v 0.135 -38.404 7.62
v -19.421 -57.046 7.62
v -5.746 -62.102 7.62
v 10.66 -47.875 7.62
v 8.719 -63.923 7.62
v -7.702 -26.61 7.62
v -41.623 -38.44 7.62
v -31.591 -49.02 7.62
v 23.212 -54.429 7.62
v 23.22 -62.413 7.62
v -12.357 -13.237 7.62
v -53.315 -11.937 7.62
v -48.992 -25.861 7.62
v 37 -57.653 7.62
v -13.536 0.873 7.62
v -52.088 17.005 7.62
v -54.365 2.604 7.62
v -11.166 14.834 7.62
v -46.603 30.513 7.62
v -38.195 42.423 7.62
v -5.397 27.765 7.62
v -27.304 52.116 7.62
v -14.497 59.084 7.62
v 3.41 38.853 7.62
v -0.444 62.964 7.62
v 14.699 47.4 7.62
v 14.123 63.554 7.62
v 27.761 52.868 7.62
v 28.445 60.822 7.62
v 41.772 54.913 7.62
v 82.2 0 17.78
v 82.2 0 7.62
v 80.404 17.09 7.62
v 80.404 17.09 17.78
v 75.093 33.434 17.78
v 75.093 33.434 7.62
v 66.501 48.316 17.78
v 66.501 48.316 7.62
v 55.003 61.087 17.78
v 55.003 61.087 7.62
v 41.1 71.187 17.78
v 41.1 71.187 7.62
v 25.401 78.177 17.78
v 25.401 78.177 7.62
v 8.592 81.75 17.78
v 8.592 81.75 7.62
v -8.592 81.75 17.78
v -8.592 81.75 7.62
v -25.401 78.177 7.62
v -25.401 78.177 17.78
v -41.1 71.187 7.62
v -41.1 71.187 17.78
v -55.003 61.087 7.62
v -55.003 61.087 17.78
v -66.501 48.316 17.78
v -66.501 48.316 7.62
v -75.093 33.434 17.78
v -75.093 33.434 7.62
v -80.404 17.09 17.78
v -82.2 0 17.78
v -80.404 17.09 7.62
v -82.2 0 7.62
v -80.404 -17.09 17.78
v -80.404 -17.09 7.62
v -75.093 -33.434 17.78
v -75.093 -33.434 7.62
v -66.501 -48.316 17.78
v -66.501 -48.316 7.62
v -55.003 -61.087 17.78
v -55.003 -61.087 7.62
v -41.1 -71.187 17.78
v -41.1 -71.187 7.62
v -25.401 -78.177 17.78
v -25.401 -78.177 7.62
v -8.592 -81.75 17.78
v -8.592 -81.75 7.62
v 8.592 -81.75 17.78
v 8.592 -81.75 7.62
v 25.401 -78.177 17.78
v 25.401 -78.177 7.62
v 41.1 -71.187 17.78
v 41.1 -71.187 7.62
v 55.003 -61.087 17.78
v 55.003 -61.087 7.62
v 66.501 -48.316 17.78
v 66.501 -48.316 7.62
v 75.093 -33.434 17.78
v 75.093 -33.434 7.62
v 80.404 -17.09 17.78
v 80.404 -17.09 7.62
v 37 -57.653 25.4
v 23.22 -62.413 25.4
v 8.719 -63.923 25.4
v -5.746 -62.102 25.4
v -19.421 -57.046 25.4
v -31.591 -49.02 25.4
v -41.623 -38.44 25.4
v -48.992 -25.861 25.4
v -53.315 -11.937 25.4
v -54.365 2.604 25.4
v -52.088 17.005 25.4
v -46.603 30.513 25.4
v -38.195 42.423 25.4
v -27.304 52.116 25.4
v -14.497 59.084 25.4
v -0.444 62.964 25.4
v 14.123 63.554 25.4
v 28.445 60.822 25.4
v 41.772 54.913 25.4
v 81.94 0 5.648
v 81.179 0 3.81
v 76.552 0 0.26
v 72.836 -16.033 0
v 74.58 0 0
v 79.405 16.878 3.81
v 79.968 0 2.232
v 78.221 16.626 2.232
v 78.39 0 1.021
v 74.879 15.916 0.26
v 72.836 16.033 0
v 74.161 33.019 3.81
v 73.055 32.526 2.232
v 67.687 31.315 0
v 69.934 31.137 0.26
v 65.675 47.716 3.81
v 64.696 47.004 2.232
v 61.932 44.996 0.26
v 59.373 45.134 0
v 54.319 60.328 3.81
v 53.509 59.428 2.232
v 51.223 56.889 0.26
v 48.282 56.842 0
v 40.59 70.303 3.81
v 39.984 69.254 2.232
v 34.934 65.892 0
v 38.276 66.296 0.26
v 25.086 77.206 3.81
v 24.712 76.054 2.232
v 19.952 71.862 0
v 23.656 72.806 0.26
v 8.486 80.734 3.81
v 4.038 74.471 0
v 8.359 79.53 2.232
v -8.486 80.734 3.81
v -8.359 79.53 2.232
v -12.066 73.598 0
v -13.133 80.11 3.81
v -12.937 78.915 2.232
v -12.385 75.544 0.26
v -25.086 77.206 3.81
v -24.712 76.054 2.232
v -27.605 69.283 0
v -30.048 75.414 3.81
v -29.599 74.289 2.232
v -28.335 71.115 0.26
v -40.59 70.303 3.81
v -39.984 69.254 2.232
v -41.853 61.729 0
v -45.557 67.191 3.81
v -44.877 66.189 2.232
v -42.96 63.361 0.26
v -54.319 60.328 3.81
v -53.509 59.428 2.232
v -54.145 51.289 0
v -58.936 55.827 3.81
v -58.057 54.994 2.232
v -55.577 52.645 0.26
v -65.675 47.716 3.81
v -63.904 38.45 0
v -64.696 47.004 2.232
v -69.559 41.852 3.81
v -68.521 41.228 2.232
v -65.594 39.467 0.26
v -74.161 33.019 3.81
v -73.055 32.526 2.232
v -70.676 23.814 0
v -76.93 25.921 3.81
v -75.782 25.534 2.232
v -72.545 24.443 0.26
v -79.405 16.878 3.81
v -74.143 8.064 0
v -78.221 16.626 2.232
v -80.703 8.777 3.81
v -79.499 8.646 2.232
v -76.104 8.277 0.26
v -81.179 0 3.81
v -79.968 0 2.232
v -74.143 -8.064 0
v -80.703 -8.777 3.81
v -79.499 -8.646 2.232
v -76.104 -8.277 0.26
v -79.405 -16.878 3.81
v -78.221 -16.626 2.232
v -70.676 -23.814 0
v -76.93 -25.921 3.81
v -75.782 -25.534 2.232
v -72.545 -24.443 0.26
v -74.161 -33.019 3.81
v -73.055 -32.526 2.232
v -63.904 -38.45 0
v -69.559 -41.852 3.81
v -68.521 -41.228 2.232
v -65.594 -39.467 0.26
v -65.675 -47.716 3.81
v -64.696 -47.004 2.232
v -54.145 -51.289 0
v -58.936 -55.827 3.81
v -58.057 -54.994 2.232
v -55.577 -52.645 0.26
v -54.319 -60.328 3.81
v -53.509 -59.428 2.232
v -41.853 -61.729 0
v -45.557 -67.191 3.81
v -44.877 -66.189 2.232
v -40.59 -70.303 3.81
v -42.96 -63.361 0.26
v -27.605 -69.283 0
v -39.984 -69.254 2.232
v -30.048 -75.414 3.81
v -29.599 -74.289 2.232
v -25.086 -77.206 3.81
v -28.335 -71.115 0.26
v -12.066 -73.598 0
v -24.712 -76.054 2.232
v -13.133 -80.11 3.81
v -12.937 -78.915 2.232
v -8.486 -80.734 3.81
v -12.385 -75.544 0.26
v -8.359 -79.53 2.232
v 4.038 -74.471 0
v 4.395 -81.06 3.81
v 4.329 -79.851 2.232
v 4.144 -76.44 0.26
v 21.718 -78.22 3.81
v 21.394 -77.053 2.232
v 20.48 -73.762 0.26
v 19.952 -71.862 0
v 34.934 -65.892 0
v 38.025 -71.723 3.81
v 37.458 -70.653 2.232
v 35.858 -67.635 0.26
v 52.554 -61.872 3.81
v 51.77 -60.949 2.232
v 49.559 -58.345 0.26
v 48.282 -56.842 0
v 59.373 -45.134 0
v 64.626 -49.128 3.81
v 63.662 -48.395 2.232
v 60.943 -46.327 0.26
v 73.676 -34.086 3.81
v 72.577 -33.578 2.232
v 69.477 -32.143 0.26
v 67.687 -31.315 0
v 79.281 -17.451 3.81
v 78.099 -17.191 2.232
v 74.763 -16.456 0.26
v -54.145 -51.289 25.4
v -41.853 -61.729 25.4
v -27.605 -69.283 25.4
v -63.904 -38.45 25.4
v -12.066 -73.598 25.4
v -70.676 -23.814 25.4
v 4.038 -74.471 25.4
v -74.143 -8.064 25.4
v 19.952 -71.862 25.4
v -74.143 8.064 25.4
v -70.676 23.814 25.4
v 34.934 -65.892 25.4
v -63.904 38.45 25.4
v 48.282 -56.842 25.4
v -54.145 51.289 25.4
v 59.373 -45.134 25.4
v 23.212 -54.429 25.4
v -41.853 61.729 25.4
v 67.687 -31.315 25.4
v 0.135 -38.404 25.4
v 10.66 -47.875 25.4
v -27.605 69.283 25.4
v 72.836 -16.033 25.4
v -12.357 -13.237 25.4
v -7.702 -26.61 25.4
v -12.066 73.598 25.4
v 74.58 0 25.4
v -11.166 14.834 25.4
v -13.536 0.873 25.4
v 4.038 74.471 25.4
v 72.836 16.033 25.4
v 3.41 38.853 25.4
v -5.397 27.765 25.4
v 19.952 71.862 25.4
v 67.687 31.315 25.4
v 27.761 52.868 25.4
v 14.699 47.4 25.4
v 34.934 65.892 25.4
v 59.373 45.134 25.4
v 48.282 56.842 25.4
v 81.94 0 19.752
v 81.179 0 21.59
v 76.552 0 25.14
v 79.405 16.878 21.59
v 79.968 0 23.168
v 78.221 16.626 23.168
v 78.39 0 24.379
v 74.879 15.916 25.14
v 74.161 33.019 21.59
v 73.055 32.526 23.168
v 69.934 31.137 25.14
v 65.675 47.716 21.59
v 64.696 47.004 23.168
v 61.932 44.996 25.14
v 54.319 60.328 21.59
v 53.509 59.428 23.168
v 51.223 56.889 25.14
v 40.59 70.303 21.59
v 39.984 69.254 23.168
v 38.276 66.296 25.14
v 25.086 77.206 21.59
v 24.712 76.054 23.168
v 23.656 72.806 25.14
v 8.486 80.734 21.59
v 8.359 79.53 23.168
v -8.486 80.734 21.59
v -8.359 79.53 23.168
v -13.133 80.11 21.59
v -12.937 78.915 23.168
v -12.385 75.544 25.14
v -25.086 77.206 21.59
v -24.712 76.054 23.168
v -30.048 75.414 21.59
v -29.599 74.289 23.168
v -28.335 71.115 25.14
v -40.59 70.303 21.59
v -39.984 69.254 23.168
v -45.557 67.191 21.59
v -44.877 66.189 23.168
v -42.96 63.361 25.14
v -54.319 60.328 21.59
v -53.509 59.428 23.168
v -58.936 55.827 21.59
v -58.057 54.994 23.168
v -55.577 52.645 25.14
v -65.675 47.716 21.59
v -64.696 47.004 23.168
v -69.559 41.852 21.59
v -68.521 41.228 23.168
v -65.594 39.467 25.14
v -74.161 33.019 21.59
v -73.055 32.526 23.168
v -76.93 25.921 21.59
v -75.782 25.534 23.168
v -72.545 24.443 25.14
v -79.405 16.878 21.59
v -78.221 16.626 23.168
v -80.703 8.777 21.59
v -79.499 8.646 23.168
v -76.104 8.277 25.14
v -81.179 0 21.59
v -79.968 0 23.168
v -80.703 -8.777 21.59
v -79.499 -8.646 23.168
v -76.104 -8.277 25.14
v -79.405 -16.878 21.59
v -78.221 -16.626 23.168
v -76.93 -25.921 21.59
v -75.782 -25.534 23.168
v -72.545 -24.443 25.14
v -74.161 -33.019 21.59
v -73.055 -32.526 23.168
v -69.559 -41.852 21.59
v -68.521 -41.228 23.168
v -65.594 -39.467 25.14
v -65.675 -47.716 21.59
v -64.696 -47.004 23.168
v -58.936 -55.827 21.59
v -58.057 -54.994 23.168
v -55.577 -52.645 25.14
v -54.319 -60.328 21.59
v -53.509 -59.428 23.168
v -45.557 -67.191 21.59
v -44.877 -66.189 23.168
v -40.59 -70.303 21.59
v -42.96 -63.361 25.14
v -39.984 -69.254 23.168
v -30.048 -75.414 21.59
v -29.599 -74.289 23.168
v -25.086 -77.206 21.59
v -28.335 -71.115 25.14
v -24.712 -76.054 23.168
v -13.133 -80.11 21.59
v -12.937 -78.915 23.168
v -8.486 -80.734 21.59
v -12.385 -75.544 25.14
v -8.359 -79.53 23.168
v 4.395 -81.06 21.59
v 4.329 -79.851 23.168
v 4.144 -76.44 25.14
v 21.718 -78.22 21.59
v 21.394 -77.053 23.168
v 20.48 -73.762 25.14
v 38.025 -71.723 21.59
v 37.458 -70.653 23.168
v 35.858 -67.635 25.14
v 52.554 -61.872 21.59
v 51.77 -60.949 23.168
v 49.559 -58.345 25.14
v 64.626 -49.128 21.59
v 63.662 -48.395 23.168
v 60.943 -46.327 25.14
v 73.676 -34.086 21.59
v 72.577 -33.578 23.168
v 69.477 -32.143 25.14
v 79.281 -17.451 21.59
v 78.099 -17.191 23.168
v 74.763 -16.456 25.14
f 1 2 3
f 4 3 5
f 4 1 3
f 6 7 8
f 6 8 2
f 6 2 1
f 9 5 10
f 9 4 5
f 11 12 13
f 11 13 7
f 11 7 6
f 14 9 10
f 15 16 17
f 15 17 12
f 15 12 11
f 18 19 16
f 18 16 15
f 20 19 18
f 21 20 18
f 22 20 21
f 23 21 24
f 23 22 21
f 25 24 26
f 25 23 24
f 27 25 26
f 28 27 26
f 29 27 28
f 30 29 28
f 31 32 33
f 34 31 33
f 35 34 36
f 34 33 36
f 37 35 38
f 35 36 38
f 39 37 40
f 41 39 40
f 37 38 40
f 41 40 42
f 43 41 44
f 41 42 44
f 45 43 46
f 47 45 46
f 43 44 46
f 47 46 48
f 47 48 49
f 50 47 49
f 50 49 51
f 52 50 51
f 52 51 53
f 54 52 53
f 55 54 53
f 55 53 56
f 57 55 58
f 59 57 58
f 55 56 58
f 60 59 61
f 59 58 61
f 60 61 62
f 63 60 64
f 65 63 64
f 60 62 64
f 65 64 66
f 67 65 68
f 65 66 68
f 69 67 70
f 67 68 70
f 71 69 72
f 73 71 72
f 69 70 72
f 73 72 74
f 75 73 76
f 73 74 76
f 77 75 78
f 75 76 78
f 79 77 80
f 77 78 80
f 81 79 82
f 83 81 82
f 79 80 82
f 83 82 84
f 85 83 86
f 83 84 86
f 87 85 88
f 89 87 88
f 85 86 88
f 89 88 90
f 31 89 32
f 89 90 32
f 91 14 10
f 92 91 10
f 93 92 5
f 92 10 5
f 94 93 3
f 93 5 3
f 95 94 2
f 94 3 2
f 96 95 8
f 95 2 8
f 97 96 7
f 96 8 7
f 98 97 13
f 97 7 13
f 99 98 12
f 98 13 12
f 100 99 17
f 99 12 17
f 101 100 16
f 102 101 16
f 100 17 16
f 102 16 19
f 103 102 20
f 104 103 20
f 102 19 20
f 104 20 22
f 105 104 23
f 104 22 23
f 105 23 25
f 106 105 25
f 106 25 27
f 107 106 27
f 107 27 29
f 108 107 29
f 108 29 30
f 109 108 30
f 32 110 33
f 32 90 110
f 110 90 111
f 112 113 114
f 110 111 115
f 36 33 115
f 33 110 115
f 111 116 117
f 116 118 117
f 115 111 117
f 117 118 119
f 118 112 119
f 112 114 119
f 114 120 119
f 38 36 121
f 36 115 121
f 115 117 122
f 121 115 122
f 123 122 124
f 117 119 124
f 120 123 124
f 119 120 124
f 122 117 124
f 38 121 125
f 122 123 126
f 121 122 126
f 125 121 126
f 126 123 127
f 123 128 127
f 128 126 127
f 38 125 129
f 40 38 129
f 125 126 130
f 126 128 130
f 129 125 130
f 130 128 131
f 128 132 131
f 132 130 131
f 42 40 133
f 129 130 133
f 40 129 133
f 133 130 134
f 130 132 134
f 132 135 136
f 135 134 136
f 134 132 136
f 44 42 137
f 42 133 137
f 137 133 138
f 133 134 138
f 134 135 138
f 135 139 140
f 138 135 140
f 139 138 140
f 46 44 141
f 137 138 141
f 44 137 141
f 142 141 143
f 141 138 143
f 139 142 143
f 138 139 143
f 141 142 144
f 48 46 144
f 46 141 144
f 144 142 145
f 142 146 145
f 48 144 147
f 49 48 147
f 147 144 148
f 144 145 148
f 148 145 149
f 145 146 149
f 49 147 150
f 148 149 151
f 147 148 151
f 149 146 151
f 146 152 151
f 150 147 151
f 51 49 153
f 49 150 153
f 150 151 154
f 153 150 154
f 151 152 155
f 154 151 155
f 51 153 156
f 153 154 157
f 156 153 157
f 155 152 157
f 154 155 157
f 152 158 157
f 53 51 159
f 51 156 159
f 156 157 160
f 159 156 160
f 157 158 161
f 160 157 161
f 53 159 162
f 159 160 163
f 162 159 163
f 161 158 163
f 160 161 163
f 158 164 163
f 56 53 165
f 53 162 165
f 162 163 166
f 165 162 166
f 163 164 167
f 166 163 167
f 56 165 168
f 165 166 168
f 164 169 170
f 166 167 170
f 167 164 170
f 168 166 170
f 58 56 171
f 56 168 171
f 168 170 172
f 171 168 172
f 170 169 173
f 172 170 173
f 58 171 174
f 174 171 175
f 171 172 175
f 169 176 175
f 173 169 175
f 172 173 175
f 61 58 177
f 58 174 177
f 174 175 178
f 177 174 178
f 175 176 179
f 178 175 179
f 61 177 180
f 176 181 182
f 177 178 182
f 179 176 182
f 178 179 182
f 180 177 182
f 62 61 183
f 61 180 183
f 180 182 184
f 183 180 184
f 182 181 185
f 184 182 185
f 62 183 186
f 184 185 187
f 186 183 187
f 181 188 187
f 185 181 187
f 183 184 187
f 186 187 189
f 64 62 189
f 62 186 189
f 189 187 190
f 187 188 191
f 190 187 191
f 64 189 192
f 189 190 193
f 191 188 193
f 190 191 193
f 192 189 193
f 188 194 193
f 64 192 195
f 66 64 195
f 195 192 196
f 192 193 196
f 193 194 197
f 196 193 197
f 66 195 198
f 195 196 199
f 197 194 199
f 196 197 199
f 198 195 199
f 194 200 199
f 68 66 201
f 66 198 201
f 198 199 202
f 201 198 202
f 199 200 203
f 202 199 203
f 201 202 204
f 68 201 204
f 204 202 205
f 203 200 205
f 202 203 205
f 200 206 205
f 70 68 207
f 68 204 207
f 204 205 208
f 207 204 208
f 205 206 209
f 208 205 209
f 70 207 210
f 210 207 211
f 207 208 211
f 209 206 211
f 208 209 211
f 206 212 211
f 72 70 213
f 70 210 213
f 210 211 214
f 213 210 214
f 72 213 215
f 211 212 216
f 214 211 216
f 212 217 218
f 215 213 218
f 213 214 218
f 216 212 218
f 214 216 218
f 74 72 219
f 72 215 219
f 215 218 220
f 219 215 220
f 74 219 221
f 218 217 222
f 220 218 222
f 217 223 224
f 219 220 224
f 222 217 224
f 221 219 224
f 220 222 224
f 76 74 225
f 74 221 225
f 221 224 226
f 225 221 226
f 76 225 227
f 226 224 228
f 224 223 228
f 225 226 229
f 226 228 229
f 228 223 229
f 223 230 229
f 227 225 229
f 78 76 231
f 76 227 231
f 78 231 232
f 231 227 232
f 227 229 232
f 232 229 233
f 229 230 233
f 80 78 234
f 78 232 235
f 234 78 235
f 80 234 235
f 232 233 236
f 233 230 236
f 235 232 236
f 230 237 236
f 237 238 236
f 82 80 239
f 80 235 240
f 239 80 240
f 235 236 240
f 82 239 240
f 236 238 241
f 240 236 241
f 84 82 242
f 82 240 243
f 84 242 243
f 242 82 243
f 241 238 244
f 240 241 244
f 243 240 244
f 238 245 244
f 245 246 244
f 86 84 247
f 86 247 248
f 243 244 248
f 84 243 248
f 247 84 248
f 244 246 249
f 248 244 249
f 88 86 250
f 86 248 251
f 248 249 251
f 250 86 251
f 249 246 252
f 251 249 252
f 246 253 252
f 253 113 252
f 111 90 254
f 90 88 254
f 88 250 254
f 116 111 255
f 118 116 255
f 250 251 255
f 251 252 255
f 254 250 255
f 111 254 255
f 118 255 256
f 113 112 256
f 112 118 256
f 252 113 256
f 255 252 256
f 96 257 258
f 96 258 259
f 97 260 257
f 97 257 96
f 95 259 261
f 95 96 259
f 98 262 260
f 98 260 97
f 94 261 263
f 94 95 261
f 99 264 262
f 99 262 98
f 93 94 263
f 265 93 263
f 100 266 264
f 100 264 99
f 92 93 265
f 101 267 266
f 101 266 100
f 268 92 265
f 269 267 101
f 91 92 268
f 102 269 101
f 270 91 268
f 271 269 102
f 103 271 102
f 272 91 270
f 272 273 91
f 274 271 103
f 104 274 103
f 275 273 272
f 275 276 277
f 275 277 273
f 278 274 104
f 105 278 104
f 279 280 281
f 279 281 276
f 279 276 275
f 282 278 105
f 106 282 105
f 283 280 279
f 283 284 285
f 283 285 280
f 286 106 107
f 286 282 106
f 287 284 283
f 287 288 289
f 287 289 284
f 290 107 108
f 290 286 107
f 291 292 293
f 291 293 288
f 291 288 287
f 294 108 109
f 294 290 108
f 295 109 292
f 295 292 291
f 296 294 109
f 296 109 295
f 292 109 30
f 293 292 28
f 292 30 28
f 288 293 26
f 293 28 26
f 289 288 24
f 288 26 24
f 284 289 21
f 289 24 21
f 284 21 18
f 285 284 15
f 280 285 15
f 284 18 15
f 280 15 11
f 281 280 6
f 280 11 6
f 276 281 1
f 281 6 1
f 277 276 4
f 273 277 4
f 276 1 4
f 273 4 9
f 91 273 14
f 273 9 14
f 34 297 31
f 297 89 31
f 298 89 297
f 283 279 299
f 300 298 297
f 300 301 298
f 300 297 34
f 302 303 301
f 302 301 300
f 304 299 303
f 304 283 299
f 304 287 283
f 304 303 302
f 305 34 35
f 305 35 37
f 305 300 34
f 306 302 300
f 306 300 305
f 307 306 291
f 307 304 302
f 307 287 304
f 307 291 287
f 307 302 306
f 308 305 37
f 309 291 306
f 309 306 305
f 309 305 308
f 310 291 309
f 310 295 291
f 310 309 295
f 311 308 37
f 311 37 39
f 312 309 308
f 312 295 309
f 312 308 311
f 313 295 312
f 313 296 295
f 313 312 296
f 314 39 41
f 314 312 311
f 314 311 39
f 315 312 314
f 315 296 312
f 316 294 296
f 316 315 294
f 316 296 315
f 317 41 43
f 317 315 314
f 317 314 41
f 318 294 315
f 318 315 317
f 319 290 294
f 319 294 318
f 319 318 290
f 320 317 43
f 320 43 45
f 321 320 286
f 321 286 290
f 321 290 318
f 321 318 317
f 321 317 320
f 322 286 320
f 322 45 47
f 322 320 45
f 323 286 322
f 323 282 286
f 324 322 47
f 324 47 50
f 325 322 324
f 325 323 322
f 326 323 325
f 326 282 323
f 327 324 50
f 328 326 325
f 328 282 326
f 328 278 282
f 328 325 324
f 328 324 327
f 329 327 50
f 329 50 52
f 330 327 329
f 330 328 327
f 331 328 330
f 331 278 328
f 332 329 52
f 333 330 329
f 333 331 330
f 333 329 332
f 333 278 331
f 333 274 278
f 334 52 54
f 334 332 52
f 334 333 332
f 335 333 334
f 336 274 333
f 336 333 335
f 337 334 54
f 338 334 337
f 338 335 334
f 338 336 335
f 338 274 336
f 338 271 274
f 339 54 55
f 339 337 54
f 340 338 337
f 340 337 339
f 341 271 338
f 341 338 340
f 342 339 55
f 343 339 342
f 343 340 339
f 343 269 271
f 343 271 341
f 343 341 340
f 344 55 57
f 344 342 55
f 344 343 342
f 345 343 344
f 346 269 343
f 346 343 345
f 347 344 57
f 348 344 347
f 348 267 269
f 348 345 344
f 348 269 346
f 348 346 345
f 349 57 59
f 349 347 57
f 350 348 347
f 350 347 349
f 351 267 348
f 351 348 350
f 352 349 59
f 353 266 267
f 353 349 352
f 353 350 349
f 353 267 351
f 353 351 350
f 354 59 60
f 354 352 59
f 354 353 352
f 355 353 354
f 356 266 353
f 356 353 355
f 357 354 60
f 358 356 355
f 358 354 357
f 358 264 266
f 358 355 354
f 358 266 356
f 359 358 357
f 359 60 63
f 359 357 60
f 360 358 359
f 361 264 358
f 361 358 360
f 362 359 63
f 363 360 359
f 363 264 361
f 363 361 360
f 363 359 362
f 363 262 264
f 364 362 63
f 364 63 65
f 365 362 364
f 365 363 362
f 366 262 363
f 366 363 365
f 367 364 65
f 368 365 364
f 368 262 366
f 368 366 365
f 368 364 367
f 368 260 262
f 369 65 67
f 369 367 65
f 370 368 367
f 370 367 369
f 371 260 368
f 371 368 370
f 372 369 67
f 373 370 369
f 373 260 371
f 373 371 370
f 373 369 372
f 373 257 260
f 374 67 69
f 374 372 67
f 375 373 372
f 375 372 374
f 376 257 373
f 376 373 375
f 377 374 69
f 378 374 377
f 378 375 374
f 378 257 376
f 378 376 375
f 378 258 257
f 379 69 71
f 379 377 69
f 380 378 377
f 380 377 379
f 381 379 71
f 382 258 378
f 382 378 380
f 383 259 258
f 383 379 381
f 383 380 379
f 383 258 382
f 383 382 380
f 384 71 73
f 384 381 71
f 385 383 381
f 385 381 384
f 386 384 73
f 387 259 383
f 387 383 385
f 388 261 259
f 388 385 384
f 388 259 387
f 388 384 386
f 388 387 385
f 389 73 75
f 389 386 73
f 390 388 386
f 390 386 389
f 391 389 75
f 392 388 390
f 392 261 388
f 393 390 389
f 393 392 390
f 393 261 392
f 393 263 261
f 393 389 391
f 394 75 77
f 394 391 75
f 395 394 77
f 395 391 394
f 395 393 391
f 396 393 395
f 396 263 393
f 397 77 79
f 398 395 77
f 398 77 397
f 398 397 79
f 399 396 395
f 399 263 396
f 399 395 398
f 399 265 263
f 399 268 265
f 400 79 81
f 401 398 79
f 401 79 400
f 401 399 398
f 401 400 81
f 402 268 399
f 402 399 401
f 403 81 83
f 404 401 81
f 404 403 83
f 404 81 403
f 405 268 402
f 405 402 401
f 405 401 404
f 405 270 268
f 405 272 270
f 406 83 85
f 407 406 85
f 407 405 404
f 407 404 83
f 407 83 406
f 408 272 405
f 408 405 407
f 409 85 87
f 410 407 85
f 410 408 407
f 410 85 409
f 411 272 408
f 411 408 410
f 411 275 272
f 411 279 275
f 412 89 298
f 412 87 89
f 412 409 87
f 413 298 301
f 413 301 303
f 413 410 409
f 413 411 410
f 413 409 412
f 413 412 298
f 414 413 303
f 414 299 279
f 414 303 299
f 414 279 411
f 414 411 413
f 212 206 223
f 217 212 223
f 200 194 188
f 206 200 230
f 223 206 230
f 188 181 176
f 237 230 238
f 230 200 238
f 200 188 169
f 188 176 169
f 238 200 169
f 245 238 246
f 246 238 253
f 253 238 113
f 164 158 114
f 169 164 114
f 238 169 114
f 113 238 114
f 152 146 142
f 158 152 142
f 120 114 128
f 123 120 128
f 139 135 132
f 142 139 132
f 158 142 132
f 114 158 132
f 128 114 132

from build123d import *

# Parameters (mm, degrees)
F0_R     = 82.200054
F0_R_2   = 75.168318
F1_DEPTH = 25.4
F2_R     = 7.62
F3_DEPTH = 7.62


with BuildPart() as f1:
    # F0 (on Top) → F1 (new body)
    with BuildSketch(Plane.XY):
        Circle(F0_R)
        Circle(F0_R_2, mode=Mode.SUBTRACT)
        Circle(F0_R_2)
        with BuildLine():
            ThreePointArc((37.00019, -57.652773), (-54.364996, 2.604364), (41.772287, 54.912514))
            ThreePointArc((41.772287, 54.912514), (-13.536125, 0.873463), (37.00019, -57.652773))
        make_face(mode=Mode.SUBTRACT)
    extrude(amount=F1_DEPTH)

    # F2
    f2_edges = [f1.edges().sort_by_distance(p)[0] for p in [
        (-82.200054, 0, 25.4),
        (-82.200054, 0, 0),
    ]]
    fillet(f2_edges, radius=F2_R)

    # F0 (on Top) → F3 (join)
    with BuildSketch(Plane.XY):
        with BuildLine():
            ThreePointArc((37.00019, -57.652773), (-13.536125, 0.873463), (41.772287, 54.912514))
            ThreePointArc((41.772287, 54.912514), (-54.364996, 2.604364), (37.00019, -57.652773))
        make_face()
    extrude(amount=F3_DEPTH)


solid = f1.part
